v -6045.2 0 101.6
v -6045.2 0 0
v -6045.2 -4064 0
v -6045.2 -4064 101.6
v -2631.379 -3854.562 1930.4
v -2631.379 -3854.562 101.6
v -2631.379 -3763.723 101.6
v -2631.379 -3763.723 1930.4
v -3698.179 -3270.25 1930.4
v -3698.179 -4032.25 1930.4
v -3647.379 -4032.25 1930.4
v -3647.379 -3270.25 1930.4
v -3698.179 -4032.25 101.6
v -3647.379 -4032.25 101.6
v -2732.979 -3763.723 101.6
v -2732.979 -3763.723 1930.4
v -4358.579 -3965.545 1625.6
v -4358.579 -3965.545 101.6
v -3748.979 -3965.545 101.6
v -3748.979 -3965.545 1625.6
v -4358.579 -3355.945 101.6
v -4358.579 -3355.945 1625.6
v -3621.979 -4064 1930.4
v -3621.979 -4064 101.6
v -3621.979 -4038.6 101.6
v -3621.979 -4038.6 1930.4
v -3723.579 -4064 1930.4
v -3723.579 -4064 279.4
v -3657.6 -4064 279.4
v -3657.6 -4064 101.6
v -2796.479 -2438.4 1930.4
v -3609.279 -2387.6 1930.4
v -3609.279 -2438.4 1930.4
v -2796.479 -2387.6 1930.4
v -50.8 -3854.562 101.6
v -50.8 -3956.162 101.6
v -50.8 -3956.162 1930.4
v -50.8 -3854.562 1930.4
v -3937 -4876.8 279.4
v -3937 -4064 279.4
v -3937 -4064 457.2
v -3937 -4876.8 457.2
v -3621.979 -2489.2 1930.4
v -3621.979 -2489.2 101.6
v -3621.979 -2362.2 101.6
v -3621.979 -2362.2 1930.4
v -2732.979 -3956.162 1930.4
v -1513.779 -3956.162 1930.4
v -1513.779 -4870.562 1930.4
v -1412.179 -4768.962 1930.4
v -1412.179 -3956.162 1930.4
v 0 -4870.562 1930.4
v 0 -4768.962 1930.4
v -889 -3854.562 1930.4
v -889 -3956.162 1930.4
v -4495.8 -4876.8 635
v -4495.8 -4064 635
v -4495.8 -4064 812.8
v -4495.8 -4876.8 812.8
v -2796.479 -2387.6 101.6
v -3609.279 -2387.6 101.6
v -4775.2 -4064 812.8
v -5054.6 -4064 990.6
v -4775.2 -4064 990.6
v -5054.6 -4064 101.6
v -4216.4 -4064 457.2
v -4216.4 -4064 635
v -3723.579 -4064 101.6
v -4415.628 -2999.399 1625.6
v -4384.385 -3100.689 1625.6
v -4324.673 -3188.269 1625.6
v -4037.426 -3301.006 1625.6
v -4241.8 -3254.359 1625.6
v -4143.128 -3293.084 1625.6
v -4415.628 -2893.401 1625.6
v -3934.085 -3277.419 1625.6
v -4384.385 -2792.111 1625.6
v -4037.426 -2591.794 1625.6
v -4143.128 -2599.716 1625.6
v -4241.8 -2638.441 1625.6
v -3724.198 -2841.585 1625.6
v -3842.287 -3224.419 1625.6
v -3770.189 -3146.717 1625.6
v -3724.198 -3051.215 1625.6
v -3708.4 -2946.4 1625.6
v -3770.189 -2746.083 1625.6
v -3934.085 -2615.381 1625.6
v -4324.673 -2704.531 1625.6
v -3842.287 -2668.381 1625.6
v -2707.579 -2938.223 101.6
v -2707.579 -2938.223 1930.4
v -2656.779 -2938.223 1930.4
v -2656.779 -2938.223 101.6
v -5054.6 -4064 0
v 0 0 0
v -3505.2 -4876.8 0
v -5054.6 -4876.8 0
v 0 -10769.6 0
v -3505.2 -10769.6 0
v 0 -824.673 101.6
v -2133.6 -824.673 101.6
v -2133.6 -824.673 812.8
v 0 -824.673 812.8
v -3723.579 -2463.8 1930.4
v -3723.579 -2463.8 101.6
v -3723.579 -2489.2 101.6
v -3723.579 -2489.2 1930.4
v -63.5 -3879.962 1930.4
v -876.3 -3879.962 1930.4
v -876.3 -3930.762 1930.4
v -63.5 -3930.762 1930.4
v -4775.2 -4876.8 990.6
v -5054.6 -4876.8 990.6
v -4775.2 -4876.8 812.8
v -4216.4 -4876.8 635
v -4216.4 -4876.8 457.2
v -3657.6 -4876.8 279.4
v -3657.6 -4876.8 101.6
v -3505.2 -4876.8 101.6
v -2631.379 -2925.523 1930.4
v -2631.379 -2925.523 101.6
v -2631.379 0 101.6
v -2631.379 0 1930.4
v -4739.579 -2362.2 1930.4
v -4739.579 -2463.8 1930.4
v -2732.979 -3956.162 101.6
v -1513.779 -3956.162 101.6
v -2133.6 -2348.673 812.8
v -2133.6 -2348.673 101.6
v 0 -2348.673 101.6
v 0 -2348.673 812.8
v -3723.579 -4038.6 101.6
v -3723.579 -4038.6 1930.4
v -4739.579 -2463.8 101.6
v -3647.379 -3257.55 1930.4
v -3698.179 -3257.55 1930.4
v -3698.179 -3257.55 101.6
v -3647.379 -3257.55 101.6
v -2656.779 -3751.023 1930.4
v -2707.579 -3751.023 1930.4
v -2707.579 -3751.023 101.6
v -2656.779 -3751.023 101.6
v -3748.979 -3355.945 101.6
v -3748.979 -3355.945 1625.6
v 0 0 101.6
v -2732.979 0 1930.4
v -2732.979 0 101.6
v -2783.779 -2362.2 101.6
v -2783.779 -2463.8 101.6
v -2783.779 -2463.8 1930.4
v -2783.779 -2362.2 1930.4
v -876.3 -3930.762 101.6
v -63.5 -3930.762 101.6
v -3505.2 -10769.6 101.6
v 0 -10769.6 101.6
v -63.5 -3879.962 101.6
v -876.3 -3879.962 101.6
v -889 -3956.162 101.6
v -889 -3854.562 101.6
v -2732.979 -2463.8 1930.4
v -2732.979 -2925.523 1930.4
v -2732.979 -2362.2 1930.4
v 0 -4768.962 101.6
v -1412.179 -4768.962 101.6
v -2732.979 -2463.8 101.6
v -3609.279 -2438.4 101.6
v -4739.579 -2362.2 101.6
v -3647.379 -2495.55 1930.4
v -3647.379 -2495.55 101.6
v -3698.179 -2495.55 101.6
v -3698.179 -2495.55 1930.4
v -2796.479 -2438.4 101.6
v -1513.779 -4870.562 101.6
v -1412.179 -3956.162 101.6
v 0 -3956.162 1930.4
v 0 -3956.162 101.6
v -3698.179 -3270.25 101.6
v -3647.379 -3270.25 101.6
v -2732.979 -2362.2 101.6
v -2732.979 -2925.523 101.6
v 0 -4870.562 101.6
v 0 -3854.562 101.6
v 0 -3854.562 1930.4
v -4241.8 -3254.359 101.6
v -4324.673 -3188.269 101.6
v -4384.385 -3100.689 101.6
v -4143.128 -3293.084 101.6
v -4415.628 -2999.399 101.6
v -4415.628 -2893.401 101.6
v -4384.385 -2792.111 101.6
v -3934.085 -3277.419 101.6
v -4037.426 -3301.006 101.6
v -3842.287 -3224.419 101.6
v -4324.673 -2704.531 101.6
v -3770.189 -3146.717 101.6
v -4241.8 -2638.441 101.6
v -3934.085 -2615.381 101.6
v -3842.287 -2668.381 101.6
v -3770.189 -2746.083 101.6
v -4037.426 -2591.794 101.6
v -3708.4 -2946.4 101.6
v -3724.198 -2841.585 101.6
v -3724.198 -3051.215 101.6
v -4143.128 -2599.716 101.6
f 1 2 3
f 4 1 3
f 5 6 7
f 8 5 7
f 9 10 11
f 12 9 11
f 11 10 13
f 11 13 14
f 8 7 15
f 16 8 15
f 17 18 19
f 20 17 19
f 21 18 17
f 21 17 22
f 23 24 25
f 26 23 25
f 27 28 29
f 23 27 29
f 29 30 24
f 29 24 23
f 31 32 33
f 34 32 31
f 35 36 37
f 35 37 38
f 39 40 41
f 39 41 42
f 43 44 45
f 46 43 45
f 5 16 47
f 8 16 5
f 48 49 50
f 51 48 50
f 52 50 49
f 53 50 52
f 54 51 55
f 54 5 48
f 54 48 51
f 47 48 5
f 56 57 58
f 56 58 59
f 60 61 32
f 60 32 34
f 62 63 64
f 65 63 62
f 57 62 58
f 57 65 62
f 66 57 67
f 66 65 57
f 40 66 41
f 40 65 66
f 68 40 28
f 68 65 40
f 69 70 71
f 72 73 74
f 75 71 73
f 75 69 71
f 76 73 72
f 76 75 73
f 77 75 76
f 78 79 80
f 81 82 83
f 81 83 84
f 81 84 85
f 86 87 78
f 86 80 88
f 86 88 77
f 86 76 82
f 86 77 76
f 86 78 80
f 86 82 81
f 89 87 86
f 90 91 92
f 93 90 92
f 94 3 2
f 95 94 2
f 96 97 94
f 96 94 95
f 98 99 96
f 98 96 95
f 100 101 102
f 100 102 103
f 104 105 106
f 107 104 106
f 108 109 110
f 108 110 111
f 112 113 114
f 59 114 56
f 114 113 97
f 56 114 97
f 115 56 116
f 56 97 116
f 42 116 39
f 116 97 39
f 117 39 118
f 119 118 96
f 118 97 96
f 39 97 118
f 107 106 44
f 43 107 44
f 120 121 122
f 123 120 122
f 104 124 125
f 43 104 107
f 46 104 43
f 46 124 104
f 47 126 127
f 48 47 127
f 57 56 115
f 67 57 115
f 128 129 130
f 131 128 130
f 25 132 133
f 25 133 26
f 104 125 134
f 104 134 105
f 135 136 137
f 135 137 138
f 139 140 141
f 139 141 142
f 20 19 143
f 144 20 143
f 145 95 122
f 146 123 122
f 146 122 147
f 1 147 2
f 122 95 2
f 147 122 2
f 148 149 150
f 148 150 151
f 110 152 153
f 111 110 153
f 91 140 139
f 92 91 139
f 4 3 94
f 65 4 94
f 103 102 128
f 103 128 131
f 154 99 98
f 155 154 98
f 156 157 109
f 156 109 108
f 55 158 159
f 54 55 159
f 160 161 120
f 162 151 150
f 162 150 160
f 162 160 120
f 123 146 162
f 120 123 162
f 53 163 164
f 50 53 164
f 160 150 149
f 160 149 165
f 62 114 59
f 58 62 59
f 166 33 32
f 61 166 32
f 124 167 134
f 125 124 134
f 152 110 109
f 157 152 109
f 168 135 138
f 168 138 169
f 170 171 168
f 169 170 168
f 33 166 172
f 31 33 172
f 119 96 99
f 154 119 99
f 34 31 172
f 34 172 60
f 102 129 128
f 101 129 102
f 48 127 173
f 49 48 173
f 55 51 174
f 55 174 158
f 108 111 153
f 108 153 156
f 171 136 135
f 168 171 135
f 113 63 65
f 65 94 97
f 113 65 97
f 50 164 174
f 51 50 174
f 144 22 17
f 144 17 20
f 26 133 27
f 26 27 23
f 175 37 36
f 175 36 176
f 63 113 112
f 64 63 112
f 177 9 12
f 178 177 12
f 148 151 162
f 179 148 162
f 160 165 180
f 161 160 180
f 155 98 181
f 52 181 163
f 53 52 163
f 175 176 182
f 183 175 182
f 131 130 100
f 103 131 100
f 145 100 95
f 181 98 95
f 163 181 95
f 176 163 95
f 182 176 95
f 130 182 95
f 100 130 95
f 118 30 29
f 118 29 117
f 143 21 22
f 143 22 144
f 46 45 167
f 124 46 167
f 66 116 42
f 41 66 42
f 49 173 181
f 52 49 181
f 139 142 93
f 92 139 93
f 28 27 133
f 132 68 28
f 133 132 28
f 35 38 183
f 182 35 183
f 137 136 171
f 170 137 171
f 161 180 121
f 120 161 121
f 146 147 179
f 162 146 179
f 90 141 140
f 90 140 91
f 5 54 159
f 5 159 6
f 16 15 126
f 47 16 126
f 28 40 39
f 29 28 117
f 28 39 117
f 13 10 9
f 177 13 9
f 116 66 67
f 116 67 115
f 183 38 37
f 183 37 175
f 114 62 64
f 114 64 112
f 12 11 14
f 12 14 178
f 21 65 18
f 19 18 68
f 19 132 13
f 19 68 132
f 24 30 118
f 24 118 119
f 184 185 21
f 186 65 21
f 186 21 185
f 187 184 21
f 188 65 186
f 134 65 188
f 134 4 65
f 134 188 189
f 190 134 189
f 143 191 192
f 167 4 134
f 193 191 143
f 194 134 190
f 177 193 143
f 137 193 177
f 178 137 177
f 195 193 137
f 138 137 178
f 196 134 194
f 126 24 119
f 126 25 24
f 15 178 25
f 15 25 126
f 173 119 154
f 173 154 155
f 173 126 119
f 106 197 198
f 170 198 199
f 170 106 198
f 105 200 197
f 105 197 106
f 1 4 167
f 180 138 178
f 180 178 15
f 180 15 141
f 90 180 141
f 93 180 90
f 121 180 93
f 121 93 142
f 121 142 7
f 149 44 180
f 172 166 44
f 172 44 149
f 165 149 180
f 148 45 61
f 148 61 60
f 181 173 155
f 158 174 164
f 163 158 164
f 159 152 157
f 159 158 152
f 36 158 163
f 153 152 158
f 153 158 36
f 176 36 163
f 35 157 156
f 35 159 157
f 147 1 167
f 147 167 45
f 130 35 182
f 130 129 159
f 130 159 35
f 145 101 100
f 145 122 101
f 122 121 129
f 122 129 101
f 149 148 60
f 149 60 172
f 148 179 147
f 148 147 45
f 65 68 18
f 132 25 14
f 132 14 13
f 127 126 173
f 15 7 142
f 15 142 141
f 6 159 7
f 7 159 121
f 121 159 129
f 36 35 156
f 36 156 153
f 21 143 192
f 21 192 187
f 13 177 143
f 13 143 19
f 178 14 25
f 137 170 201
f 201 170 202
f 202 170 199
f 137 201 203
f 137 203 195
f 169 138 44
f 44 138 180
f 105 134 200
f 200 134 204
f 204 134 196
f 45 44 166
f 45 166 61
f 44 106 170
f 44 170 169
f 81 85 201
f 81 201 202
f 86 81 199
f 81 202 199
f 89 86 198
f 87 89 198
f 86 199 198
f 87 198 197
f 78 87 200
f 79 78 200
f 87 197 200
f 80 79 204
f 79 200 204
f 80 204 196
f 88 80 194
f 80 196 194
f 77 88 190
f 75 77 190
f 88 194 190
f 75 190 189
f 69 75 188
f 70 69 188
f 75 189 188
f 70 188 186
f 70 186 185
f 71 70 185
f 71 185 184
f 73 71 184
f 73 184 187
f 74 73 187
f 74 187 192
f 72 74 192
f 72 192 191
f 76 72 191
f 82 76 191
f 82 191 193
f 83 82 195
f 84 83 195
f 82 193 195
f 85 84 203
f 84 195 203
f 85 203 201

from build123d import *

# Parameters (mm, degrees)
F1_DEPTH  = 101.6
F2_R      = 355.6
F2_W      = 609.6
F2_H      = 609.6
F3_DEPTH  = 1524
F4_W      = 101.6
F4_H      = 25.4
F4_W_2    = 50.8
F4_H_2    = 762
F4_H_3    = 101.6
F4_W_3    = 812.8
F4_H_4    = 50.8
F4_H_5    = 812.8
F5_DEPTH  = 1828.8
F6_W      = 279.4
F6_H      = 812.8
F7_DEPTH  = 279.4
F8_W      = 279.4
F8_H      = 812.8
F9_DEPTH  = 457.2
F10_W     = 279.4
F10_H     = 812.8
F11_DEPTH = 635
F12_W     = 279.4
F12_H     = 812.8
F13_DEPTH = 812.8
F14_W     = 279.4
F14_H     = 812.8
F15_DEPTH = 990.6
F16_W     = 2133.6
F16_H     = 1524
F17_DEPTH = 711.2


with BuildPart() as f1:
    # F0 (on Top) → F1 (new body)
    with BuildSketch(Plane.XY):
        Polygon((0, -4064), (0, 0), (-6045.2, 0), (-6045.2, -4064), (-3657.6, -4064), (-3657.6, -4876.8), (-3505.2, -4876.8), (-3505.2, -10769.6), (0, -10769.6), align=None)
    extrude(amount=F1_DEPTH)

    # F2 (on face) → F3 (join)
    with BuildSketch(Plane.XY.offset(101.6)):
        with Locations((-4064, -2946.4)):
            Circle(F2_R)
        with Locations((-4053.779092, -3660.744939)):
            Rectangle(F2_W, F2_H)
    extrude(amount=F3_DEPTH)

    # F4 (on face) → F5 (join)
    with BuildSketch(Plane.XY.offset(101.6)):
        with Locations((-3672.779092, -4051.3)):
            Rectangle(F4_W, F4_H)
        with Locations((-3672.779092, -3651.25)):
            Rectangle(F4_W_2, F4_H_2)
        with Locations((-3672.779092, -2876.55)):
            Rectangle(F4_W_2, F4_H_2)
        Polygon((-3723.579092, -2463.8), (-3723.579092, -2489.2), (-3621.979092, -2489.2), (-3621.979092, -2463.8), (-3621.979092, -2362.2), (-4739.579092, -2362.2), (-4739.579092, -2463.8), align=None)
        Polygon((-2631.379092, -2925.523135), (-2631.379092, 0), (-2732.979092, 0), (-2732.979092, -2362.2), (-2732.979092, -2463.8), (-2732.979092, -2925.523135), align=None)
        with Locations((-2758.379092, -2413)):
            Rectangle(F4_W_2, F4_H_3)
        Polygon((-889, -3854.562453), (-2631.379092, -3854.562453), (-2631.379092, -3763.723135), (-2732.979092, -3763.723135), (-2732.979092, -3854.562453), (-2732.979092, -3956.162453), (-1513.779092, -3956.162453), (-1513.779092, -4870.562453), (-1412.179092, -4870.562453), (0, -4870.562453), (0, -4768.962453), (-1412.179092, -4768.962453), (-1412.179092, -3956.162453), (-889, -3956.162453), align=None)
        with Locations((-25.4, -3905.362453)):
            Rectangle(F4_W_2, F4_H_3)
        with Locations((-3202.879092, -2413)):
            Rectangle(F4_W_3, F4_H_4)
        with Locations((-2682.179092, -3344.623135)):
            Rectangle(F4_W_2, F4_H_5)
        with Locations((-469.9, -3905.362453)):
            Rectangle(F4_W_3, F4_H_4)
    extrude(amount=F5_DEPTH)

    # F6 (on face) → F7 (join)
    with BuildSketch(Plane(origin=(0, 0, 0), x_dir=(1, 0, 0), z_dir=(0, 0, -1))):
        with Locations((-3797.3, 4470.4)):
            Rectangle(F6_W, F6_H)
    extrude(amount=-F7_DEPTH)

    # F8 (on face) → F9 (join)
    with BuildSketch(Plane(origin=(0, 0, 0), x_dir=(1, 0, 0), z_dir=(0, 0, -1))):
        with Locations((-4076.7, 4470.4)):
            Rectangle(F8_W, F8_H)
    extrude(amount=-F9_DEPTH)

    # F10 (on face) → F11 (join)
    with BuildSketch(Plane(origin=(0, 0, 0), x_dir=(1, 0, 0), z_dir=(0, 0, -1))):
        with Locations((-4356.1, 4470.4)):
            Rectangle(F10_W, F10_H)
    extrude(amount=-F11_DEPTH)

    # F12 (on face) → F13 (join)
    with BuildSketch(Plane(origin=(0, 0, 0), x_dir=(1, 0, 0), z_dir=(0, 0, -1))):
        with Locations((-4635.5, 4470.4)):
            Rectangle(F12_W, F12_H)
    extrude(amount=-F13_DEPTH)

    # F14 (on face) → F15 (join)
    with BuildSketch(Plane(origin=(0, 0, 0), x_dir=(1, 0, 0), z_dir=(0, 0, -1))):
        with Locations((-4914.9, 4470.4)):
            Rectangle(F14_W, F14_H)
    extrude(amount=-F15_DEPTH)

    # F16 (on face) → F17 (join)
    with BuildSketch(Plane.XY.offset(101.6)):
        with Locations((-1066.8, -1586.673176)):
            Rectangle(F16_W, F16_H)
    extrude(amount=F17_DEPTH)


solid = f1.part
